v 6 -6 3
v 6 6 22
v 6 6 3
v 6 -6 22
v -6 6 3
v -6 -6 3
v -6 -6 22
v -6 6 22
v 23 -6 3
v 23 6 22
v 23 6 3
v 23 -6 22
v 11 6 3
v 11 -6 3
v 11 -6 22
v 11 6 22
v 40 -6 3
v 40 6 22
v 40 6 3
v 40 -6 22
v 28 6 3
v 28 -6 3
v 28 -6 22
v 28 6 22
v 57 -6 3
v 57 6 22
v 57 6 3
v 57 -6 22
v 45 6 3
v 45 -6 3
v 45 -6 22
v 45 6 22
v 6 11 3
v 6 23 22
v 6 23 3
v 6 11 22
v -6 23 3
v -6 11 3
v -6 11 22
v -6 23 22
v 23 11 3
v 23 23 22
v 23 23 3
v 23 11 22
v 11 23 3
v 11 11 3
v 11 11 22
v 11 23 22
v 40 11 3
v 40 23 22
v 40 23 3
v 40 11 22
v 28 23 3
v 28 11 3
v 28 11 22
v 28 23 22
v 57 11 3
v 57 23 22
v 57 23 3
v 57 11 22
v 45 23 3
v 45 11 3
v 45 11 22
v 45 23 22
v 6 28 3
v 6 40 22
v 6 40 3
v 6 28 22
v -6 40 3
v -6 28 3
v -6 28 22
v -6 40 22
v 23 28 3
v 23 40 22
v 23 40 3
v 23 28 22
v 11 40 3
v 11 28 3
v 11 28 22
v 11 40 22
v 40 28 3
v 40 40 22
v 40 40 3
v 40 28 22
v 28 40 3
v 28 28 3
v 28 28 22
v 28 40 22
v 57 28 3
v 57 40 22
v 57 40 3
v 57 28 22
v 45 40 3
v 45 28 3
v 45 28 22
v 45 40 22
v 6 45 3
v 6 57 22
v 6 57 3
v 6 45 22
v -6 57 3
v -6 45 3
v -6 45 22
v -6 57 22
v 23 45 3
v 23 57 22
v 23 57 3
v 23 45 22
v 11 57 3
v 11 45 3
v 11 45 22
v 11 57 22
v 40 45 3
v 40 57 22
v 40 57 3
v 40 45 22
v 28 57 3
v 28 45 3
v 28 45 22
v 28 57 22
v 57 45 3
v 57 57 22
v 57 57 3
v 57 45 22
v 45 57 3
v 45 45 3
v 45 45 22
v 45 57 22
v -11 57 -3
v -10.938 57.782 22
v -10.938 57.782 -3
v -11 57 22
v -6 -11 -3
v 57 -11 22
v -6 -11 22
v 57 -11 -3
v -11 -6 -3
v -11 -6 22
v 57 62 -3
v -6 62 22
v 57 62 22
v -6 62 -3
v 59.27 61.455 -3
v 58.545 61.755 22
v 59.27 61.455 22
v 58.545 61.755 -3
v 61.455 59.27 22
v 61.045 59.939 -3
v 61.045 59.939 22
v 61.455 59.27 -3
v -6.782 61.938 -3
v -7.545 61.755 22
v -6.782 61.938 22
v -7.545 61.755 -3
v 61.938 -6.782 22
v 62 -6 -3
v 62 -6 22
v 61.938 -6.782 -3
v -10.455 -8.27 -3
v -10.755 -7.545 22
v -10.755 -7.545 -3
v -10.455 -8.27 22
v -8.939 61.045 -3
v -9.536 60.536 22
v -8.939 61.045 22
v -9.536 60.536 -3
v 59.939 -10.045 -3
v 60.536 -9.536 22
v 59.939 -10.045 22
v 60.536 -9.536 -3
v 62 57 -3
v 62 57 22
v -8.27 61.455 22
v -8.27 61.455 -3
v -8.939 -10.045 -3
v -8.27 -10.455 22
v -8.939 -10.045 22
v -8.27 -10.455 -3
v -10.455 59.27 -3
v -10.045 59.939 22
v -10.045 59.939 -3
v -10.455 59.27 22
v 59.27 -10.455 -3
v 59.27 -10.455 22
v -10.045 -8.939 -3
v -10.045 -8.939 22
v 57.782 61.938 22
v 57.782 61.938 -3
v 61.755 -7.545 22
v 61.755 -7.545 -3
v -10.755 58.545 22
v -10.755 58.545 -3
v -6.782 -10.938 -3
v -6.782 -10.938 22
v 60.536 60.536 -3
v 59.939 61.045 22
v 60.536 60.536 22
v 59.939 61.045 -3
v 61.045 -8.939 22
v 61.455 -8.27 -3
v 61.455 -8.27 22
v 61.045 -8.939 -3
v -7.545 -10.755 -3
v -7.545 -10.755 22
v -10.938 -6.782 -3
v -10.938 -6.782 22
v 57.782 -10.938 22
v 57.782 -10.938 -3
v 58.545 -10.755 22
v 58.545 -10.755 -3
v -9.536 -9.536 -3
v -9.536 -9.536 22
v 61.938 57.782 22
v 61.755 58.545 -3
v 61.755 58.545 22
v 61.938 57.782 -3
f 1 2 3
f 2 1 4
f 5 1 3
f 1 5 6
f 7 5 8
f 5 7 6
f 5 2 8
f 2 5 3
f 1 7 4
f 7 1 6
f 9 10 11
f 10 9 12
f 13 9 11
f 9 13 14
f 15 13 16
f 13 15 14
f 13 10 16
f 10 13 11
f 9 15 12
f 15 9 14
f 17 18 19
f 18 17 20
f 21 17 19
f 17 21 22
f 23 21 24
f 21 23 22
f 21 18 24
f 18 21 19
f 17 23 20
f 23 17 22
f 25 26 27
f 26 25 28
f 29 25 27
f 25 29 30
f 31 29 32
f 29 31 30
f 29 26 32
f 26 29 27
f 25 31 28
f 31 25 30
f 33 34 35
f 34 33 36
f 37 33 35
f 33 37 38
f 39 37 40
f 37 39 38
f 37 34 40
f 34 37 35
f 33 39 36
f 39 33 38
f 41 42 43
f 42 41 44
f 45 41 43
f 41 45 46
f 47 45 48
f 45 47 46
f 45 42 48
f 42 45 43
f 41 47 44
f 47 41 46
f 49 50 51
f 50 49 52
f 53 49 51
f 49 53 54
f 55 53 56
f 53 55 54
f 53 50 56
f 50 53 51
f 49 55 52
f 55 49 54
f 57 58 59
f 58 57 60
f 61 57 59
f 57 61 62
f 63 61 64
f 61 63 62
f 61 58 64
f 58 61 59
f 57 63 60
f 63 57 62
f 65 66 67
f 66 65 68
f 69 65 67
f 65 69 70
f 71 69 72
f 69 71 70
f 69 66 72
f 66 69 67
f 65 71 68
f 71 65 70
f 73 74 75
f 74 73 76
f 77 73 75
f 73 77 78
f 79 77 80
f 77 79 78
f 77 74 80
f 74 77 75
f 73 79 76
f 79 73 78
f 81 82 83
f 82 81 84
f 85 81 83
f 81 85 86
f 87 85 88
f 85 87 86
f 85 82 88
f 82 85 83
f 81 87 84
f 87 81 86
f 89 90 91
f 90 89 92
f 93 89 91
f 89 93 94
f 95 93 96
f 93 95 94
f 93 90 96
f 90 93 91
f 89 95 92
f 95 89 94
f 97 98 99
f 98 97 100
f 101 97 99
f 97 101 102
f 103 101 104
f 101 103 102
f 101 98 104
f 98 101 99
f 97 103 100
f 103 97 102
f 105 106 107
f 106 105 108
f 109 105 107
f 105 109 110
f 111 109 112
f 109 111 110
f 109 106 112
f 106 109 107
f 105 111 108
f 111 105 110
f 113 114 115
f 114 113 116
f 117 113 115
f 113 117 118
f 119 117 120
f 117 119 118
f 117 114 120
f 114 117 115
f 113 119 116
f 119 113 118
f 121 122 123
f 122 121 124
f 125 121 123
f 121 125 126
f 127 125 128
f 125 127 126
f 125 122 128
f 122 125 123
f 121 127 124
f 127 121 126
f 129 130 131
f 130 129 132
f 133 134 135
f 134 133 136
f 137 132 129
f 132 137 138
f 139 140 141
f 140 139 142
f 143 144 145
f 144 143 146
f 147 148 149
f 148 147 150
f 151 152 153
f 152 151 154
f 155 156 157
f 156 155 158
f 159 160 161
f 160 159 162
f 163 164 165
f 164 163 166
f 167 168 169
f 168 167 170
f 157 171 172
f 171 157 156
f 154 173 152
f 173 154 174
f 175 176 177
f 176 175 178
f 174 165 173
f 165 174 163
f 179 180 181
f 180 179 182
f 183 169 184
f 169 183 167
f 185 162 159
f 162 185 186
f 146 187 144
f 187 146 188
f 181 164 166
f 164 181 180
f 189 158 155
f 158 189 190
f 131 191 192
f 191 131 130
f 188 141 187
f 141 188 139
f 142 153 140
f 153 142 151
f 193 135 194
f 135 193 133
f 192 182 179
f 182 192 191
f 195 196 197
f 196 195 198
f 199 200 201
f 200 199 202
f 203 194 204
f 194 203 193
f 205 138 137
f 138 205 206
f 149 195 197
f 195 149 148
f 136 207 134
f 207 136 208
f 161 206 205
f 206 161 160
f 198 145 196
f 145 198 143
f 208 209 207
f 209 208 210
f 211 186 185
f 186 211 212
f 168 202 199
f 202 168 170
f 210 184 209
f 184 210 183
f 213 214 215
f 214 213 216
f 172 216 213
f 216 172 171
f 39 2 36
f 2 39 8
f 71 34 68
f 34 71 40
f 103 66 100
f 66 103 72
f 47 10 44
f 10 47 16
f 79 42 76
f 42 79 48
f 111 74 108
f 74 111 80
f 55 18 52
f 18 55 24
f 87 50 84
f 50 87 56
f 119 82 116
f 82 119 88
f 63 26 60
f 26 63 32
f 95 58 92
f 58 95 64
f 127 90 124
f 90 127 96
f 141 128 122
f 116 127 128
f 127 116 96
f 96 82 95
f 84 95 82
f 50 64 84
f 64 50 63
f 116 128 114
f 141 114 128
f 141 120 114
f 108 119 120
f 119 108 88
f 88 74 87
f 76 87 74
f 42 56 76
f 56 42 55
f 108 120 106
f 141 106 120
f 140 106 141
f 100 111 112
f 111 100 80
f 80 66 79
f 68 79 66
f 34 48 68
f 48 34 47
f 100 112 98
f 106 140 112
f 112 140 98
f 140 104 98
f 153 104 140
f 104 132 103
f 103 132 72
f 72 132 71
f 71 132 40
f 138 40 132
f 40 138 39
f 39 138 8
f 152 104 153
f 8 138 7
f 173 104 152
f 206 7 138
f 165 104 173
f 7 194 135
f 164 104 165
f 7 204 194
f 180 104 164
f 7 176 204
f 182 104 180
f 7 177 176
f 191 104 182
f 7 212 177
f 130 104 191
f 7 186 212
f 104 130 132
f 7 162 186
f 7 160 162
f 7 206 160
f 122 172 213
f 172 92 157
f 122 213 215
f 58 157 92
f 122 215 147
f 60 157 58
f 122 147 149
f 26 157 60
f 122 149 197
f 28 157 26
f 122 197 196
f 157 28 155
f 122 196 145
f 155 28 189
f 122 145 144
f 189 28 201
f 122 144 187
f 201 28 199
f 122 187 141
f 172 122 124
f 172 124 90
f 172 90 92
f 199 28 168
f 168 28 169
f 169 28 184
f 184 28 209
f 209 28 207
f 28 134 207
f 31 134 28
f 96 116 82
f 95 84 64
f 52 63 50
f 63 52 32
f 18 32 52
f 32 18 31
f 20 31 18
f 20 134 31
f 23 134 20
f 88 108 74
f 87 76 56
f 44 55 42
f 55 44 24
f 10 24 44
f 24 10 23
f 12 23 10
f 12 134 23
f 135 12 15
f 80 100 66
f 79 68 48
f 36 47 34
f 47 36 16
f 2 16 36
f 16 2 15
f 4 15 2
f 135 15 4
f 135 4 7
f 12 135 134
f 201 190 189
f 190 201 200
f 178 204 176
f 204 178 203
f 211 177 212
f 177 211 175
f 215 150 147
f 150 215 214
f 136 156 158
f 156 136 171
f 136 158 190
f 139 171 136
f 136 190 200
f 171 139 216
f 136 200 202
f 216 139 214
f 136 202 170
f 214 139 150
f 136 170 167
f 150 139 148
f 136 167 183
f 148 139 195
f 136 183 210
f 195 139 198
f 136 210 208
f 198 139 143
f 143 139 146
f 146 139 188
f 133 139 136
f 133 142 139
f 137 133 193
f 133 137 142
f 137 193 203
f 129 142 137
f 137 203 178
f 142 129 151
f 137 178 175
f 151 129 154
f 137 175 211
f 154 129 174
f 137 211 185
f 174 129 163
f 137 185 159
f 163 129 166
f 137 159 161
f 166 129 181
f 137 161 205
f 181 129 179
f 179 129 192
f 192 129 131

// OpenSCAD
/*
CNC End Mills Holder (c) by Jorge Monteiro

CNC End Mills Holder is licensed under a
Creative Commons Attribution-ShareAlike 4.0 International.

You should have received a copy of the license along with this
work.  If not, see <http://creativecommons.org/licenses/by-sa/4.0/>.
*/

/* [Basics] */
// Space between end mills in mm
endMillGap = 5;
// Diameter of end mill in mm
endMillSize = 12;
// Number of end mills you want to store per row
endMillsPerRow = 4;
// Number of end mills you want to store per column
endMillsPerColumn = 4;
// Height of the end mill box in mm
height = 25;
// Base of the box in mm
baseHeight = 3;

/* [Ignore] */
$fn=40*1;
endMillDim = endMillSize/2;
width = endMillsPerRow * (endMillGap + endMillSize) + endMillGap;
length = endMillsPerColumn * (endMillGap + endMillSize) + endMillGap;
endMillHeight = height - baseHeight;

difference() {
    
    translate([length/2-(endMillGap+endMillDim), width/2-(endMillGap+endMillDim), -3]) roundedCube(length, width, height, 5);
    drawEndMillHolders();
};

module drawEndMillHolders() {
     for(row = [0 : 1 : endMillsPerRow-1]) {
         for(column = [0 : 1 : endMillsPerColumn-1]) {
            translate([(endMillGap+endMillSize)*column, (endMillGap+endMillSize)*row, height-endMillHeight/2]) cube([endMillSize, endMillSize, endMillHeight], true);
         }
     }

}

module roundedCube(xdim, ydim, zdim, rdim) {
    translate([-xdim/2,-ydim/2,0]){
        hull(){
            translate([rdim,rdim,0]) cylinder(r=rdim, h=zdim);
            translate([xdim-rdim,rdim,0]) cylinder(r=rdim, h=zdim);

            translate([rdim,ydim-rdim,0]) cylinder(r=rdim, h=zdim);
            translate([xdim-rdim,ydim-rdim,0]) cylinder(r=rdim, h=zdim);

        };
    };
};
